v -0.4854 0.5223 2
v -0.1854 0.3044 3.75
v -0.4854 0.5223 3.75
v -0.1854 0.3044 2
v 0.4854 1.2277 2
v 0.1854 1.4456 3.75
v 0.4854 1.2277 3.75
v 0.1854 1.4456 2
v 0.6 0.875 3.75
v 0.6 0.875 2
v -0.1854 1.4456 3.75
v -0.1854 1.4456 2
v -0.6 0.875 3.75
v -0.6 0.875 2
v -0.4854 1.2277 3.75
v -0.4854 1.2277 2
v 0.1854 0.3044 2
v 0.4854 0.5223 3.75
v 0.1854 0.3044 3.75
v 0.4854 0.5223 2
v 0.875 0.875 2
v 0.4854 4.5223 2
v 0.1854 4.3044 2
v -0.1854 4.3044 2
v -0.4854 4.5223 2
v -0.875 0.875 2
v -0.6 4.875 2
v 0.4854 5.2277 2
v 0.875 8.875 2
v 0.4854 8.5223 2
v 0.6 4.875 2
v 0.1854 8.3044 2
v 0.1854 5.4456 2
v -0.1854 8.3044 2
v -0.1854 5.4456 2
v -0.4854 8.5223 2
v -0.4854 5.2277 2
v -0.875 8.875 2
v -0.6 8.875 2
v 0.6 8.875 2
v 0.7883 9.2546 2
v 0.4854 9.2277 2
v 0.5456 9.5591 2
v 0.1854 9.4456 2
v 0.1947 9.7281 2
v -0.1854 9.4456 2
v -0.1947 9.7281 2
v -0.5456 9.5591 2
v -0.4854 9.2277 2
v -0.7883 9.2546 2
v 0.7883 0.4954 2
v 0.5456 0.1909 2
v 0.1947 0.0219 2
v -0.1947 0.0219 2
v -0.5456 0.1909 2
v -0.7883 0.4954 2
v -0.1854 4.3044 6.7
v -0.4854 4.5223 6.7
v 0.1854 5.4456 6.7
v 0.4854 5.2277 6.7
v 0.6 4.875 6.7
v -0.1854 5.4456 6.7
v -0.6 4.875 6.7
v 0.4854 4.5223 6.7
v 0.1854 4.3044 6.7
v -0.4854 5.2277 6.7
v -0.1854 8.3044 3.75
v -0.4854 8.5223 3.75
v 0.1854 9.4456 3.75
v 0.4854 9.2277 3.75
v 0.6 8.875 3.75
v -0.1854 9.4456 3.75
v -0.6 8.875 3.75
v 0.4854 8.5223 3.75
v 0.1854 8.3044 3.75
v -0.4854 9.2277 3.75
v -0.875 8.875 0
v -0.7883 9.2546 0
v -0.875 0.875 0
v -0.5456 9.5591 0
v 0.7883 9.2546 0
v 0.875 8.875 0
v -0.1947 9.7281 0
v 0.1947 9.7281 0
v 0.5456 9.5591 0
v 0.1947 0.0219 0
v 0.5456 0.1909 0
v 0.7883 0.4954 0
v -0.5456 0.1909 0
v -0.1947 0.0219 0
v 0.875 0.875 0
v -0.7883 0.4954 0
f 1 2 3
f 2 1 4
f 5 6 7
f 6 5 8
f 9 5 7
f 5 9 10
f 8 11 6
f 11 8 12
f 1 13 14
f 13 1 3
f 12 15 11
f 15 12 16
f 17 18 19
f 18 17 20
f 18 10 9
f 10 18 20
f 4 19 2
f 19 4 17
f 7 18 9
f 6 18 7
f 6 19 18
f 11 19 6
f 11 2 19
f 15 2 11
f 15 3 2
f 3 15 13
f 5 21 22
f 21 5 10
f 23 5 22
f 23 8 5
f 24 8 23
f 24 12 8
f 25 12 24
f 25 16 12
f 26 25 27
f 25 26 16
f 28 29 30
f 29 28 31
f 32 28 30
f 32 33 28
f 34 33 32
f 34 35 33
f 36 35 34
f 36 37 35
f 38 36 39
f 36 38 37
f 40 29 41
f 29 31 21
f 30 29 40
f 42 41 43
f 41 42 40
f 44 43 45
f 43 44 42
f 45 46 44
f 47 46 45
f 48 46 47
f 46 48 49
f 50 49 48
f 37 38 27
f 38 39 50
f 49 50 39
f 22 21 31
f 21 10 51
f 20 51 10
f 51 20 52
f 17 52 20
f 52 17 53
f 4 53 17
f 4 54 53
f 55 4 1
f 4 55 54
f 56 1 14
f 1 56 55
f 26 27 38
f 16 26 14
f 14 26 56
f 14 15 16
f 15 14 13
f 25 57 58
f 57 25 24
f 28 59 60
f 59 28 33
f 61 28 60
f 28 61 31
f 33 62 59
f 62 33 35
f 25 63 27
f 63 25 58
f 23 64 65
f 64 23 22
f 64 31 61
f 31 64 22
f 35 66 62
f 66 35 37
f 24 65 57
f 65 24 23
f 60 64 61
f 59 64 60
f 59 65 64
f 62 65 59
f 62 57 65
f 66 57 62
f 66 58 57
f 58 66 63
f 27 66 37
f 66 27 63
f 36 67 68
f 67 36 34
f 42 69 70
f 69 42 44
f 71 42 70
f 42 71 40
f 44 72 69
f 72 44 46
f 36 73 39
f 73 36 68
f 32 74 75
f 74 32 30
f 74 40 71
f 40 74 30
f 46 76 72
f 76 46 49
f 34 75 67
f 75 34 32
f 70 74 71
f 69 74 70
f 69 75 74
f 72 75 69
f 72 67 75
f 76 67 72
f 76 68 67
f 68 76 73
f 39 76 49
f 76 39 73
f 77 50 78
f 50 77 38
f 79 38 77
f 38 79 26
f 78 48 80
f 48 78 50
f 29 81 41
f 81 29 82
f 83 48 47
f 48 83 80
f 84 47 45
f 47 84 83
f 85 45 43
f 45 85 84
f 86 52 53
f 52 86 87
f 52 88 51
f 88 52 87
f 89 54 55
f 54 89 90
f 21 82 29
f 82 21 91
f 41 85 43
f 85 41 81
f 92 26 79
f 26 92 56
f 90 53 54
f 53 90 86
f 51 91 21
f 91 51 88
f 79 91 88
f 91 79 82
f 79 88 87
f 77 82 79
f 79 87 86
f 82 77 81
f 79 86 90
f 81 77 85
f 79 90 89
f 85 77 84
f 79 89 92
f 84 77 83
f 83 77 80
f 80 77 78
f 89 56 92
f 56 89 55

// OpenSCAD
$fa=1;
$fs=0.4;

module base(width, length, height)
{
    translate([0, width/2, height/2])
    hull()
    {
        cylinder(r=width/2, height, center=true);
        translate([0,length-width,0])
            cylinder(r=width/2, height, center=true);
    }
}

module mount_pegs(center_length, side_length, peg_radius, base_height, base_width, base_length)
{
    // first aligner
    translate([0, base_width/2, base_height+side_length/2])
        cylinder(r=peg_radius, side_length, center=true);
    // actuator
    translate([0, base_length/2, base_height+center_length/2])
        cylinder(r=peg_radius, center_length, center=true);
    // second aligner
    translate([0, base_length-base_width/2, base_height+side_length/2])
        cylinder(r=peg_radius, side_length, center=true);
}

base_width      = 1.75;
base_height     = 2;
base_length     = 9.75;

actuator_length = 4.7;
aligner_length  = 1.75;
peg_radius      = 1.2/2;

base(base_width, base_length, base_height);

mount_pegs(actuator_length, aligner_length, peg_radius, base_height, base_width, base_length);
